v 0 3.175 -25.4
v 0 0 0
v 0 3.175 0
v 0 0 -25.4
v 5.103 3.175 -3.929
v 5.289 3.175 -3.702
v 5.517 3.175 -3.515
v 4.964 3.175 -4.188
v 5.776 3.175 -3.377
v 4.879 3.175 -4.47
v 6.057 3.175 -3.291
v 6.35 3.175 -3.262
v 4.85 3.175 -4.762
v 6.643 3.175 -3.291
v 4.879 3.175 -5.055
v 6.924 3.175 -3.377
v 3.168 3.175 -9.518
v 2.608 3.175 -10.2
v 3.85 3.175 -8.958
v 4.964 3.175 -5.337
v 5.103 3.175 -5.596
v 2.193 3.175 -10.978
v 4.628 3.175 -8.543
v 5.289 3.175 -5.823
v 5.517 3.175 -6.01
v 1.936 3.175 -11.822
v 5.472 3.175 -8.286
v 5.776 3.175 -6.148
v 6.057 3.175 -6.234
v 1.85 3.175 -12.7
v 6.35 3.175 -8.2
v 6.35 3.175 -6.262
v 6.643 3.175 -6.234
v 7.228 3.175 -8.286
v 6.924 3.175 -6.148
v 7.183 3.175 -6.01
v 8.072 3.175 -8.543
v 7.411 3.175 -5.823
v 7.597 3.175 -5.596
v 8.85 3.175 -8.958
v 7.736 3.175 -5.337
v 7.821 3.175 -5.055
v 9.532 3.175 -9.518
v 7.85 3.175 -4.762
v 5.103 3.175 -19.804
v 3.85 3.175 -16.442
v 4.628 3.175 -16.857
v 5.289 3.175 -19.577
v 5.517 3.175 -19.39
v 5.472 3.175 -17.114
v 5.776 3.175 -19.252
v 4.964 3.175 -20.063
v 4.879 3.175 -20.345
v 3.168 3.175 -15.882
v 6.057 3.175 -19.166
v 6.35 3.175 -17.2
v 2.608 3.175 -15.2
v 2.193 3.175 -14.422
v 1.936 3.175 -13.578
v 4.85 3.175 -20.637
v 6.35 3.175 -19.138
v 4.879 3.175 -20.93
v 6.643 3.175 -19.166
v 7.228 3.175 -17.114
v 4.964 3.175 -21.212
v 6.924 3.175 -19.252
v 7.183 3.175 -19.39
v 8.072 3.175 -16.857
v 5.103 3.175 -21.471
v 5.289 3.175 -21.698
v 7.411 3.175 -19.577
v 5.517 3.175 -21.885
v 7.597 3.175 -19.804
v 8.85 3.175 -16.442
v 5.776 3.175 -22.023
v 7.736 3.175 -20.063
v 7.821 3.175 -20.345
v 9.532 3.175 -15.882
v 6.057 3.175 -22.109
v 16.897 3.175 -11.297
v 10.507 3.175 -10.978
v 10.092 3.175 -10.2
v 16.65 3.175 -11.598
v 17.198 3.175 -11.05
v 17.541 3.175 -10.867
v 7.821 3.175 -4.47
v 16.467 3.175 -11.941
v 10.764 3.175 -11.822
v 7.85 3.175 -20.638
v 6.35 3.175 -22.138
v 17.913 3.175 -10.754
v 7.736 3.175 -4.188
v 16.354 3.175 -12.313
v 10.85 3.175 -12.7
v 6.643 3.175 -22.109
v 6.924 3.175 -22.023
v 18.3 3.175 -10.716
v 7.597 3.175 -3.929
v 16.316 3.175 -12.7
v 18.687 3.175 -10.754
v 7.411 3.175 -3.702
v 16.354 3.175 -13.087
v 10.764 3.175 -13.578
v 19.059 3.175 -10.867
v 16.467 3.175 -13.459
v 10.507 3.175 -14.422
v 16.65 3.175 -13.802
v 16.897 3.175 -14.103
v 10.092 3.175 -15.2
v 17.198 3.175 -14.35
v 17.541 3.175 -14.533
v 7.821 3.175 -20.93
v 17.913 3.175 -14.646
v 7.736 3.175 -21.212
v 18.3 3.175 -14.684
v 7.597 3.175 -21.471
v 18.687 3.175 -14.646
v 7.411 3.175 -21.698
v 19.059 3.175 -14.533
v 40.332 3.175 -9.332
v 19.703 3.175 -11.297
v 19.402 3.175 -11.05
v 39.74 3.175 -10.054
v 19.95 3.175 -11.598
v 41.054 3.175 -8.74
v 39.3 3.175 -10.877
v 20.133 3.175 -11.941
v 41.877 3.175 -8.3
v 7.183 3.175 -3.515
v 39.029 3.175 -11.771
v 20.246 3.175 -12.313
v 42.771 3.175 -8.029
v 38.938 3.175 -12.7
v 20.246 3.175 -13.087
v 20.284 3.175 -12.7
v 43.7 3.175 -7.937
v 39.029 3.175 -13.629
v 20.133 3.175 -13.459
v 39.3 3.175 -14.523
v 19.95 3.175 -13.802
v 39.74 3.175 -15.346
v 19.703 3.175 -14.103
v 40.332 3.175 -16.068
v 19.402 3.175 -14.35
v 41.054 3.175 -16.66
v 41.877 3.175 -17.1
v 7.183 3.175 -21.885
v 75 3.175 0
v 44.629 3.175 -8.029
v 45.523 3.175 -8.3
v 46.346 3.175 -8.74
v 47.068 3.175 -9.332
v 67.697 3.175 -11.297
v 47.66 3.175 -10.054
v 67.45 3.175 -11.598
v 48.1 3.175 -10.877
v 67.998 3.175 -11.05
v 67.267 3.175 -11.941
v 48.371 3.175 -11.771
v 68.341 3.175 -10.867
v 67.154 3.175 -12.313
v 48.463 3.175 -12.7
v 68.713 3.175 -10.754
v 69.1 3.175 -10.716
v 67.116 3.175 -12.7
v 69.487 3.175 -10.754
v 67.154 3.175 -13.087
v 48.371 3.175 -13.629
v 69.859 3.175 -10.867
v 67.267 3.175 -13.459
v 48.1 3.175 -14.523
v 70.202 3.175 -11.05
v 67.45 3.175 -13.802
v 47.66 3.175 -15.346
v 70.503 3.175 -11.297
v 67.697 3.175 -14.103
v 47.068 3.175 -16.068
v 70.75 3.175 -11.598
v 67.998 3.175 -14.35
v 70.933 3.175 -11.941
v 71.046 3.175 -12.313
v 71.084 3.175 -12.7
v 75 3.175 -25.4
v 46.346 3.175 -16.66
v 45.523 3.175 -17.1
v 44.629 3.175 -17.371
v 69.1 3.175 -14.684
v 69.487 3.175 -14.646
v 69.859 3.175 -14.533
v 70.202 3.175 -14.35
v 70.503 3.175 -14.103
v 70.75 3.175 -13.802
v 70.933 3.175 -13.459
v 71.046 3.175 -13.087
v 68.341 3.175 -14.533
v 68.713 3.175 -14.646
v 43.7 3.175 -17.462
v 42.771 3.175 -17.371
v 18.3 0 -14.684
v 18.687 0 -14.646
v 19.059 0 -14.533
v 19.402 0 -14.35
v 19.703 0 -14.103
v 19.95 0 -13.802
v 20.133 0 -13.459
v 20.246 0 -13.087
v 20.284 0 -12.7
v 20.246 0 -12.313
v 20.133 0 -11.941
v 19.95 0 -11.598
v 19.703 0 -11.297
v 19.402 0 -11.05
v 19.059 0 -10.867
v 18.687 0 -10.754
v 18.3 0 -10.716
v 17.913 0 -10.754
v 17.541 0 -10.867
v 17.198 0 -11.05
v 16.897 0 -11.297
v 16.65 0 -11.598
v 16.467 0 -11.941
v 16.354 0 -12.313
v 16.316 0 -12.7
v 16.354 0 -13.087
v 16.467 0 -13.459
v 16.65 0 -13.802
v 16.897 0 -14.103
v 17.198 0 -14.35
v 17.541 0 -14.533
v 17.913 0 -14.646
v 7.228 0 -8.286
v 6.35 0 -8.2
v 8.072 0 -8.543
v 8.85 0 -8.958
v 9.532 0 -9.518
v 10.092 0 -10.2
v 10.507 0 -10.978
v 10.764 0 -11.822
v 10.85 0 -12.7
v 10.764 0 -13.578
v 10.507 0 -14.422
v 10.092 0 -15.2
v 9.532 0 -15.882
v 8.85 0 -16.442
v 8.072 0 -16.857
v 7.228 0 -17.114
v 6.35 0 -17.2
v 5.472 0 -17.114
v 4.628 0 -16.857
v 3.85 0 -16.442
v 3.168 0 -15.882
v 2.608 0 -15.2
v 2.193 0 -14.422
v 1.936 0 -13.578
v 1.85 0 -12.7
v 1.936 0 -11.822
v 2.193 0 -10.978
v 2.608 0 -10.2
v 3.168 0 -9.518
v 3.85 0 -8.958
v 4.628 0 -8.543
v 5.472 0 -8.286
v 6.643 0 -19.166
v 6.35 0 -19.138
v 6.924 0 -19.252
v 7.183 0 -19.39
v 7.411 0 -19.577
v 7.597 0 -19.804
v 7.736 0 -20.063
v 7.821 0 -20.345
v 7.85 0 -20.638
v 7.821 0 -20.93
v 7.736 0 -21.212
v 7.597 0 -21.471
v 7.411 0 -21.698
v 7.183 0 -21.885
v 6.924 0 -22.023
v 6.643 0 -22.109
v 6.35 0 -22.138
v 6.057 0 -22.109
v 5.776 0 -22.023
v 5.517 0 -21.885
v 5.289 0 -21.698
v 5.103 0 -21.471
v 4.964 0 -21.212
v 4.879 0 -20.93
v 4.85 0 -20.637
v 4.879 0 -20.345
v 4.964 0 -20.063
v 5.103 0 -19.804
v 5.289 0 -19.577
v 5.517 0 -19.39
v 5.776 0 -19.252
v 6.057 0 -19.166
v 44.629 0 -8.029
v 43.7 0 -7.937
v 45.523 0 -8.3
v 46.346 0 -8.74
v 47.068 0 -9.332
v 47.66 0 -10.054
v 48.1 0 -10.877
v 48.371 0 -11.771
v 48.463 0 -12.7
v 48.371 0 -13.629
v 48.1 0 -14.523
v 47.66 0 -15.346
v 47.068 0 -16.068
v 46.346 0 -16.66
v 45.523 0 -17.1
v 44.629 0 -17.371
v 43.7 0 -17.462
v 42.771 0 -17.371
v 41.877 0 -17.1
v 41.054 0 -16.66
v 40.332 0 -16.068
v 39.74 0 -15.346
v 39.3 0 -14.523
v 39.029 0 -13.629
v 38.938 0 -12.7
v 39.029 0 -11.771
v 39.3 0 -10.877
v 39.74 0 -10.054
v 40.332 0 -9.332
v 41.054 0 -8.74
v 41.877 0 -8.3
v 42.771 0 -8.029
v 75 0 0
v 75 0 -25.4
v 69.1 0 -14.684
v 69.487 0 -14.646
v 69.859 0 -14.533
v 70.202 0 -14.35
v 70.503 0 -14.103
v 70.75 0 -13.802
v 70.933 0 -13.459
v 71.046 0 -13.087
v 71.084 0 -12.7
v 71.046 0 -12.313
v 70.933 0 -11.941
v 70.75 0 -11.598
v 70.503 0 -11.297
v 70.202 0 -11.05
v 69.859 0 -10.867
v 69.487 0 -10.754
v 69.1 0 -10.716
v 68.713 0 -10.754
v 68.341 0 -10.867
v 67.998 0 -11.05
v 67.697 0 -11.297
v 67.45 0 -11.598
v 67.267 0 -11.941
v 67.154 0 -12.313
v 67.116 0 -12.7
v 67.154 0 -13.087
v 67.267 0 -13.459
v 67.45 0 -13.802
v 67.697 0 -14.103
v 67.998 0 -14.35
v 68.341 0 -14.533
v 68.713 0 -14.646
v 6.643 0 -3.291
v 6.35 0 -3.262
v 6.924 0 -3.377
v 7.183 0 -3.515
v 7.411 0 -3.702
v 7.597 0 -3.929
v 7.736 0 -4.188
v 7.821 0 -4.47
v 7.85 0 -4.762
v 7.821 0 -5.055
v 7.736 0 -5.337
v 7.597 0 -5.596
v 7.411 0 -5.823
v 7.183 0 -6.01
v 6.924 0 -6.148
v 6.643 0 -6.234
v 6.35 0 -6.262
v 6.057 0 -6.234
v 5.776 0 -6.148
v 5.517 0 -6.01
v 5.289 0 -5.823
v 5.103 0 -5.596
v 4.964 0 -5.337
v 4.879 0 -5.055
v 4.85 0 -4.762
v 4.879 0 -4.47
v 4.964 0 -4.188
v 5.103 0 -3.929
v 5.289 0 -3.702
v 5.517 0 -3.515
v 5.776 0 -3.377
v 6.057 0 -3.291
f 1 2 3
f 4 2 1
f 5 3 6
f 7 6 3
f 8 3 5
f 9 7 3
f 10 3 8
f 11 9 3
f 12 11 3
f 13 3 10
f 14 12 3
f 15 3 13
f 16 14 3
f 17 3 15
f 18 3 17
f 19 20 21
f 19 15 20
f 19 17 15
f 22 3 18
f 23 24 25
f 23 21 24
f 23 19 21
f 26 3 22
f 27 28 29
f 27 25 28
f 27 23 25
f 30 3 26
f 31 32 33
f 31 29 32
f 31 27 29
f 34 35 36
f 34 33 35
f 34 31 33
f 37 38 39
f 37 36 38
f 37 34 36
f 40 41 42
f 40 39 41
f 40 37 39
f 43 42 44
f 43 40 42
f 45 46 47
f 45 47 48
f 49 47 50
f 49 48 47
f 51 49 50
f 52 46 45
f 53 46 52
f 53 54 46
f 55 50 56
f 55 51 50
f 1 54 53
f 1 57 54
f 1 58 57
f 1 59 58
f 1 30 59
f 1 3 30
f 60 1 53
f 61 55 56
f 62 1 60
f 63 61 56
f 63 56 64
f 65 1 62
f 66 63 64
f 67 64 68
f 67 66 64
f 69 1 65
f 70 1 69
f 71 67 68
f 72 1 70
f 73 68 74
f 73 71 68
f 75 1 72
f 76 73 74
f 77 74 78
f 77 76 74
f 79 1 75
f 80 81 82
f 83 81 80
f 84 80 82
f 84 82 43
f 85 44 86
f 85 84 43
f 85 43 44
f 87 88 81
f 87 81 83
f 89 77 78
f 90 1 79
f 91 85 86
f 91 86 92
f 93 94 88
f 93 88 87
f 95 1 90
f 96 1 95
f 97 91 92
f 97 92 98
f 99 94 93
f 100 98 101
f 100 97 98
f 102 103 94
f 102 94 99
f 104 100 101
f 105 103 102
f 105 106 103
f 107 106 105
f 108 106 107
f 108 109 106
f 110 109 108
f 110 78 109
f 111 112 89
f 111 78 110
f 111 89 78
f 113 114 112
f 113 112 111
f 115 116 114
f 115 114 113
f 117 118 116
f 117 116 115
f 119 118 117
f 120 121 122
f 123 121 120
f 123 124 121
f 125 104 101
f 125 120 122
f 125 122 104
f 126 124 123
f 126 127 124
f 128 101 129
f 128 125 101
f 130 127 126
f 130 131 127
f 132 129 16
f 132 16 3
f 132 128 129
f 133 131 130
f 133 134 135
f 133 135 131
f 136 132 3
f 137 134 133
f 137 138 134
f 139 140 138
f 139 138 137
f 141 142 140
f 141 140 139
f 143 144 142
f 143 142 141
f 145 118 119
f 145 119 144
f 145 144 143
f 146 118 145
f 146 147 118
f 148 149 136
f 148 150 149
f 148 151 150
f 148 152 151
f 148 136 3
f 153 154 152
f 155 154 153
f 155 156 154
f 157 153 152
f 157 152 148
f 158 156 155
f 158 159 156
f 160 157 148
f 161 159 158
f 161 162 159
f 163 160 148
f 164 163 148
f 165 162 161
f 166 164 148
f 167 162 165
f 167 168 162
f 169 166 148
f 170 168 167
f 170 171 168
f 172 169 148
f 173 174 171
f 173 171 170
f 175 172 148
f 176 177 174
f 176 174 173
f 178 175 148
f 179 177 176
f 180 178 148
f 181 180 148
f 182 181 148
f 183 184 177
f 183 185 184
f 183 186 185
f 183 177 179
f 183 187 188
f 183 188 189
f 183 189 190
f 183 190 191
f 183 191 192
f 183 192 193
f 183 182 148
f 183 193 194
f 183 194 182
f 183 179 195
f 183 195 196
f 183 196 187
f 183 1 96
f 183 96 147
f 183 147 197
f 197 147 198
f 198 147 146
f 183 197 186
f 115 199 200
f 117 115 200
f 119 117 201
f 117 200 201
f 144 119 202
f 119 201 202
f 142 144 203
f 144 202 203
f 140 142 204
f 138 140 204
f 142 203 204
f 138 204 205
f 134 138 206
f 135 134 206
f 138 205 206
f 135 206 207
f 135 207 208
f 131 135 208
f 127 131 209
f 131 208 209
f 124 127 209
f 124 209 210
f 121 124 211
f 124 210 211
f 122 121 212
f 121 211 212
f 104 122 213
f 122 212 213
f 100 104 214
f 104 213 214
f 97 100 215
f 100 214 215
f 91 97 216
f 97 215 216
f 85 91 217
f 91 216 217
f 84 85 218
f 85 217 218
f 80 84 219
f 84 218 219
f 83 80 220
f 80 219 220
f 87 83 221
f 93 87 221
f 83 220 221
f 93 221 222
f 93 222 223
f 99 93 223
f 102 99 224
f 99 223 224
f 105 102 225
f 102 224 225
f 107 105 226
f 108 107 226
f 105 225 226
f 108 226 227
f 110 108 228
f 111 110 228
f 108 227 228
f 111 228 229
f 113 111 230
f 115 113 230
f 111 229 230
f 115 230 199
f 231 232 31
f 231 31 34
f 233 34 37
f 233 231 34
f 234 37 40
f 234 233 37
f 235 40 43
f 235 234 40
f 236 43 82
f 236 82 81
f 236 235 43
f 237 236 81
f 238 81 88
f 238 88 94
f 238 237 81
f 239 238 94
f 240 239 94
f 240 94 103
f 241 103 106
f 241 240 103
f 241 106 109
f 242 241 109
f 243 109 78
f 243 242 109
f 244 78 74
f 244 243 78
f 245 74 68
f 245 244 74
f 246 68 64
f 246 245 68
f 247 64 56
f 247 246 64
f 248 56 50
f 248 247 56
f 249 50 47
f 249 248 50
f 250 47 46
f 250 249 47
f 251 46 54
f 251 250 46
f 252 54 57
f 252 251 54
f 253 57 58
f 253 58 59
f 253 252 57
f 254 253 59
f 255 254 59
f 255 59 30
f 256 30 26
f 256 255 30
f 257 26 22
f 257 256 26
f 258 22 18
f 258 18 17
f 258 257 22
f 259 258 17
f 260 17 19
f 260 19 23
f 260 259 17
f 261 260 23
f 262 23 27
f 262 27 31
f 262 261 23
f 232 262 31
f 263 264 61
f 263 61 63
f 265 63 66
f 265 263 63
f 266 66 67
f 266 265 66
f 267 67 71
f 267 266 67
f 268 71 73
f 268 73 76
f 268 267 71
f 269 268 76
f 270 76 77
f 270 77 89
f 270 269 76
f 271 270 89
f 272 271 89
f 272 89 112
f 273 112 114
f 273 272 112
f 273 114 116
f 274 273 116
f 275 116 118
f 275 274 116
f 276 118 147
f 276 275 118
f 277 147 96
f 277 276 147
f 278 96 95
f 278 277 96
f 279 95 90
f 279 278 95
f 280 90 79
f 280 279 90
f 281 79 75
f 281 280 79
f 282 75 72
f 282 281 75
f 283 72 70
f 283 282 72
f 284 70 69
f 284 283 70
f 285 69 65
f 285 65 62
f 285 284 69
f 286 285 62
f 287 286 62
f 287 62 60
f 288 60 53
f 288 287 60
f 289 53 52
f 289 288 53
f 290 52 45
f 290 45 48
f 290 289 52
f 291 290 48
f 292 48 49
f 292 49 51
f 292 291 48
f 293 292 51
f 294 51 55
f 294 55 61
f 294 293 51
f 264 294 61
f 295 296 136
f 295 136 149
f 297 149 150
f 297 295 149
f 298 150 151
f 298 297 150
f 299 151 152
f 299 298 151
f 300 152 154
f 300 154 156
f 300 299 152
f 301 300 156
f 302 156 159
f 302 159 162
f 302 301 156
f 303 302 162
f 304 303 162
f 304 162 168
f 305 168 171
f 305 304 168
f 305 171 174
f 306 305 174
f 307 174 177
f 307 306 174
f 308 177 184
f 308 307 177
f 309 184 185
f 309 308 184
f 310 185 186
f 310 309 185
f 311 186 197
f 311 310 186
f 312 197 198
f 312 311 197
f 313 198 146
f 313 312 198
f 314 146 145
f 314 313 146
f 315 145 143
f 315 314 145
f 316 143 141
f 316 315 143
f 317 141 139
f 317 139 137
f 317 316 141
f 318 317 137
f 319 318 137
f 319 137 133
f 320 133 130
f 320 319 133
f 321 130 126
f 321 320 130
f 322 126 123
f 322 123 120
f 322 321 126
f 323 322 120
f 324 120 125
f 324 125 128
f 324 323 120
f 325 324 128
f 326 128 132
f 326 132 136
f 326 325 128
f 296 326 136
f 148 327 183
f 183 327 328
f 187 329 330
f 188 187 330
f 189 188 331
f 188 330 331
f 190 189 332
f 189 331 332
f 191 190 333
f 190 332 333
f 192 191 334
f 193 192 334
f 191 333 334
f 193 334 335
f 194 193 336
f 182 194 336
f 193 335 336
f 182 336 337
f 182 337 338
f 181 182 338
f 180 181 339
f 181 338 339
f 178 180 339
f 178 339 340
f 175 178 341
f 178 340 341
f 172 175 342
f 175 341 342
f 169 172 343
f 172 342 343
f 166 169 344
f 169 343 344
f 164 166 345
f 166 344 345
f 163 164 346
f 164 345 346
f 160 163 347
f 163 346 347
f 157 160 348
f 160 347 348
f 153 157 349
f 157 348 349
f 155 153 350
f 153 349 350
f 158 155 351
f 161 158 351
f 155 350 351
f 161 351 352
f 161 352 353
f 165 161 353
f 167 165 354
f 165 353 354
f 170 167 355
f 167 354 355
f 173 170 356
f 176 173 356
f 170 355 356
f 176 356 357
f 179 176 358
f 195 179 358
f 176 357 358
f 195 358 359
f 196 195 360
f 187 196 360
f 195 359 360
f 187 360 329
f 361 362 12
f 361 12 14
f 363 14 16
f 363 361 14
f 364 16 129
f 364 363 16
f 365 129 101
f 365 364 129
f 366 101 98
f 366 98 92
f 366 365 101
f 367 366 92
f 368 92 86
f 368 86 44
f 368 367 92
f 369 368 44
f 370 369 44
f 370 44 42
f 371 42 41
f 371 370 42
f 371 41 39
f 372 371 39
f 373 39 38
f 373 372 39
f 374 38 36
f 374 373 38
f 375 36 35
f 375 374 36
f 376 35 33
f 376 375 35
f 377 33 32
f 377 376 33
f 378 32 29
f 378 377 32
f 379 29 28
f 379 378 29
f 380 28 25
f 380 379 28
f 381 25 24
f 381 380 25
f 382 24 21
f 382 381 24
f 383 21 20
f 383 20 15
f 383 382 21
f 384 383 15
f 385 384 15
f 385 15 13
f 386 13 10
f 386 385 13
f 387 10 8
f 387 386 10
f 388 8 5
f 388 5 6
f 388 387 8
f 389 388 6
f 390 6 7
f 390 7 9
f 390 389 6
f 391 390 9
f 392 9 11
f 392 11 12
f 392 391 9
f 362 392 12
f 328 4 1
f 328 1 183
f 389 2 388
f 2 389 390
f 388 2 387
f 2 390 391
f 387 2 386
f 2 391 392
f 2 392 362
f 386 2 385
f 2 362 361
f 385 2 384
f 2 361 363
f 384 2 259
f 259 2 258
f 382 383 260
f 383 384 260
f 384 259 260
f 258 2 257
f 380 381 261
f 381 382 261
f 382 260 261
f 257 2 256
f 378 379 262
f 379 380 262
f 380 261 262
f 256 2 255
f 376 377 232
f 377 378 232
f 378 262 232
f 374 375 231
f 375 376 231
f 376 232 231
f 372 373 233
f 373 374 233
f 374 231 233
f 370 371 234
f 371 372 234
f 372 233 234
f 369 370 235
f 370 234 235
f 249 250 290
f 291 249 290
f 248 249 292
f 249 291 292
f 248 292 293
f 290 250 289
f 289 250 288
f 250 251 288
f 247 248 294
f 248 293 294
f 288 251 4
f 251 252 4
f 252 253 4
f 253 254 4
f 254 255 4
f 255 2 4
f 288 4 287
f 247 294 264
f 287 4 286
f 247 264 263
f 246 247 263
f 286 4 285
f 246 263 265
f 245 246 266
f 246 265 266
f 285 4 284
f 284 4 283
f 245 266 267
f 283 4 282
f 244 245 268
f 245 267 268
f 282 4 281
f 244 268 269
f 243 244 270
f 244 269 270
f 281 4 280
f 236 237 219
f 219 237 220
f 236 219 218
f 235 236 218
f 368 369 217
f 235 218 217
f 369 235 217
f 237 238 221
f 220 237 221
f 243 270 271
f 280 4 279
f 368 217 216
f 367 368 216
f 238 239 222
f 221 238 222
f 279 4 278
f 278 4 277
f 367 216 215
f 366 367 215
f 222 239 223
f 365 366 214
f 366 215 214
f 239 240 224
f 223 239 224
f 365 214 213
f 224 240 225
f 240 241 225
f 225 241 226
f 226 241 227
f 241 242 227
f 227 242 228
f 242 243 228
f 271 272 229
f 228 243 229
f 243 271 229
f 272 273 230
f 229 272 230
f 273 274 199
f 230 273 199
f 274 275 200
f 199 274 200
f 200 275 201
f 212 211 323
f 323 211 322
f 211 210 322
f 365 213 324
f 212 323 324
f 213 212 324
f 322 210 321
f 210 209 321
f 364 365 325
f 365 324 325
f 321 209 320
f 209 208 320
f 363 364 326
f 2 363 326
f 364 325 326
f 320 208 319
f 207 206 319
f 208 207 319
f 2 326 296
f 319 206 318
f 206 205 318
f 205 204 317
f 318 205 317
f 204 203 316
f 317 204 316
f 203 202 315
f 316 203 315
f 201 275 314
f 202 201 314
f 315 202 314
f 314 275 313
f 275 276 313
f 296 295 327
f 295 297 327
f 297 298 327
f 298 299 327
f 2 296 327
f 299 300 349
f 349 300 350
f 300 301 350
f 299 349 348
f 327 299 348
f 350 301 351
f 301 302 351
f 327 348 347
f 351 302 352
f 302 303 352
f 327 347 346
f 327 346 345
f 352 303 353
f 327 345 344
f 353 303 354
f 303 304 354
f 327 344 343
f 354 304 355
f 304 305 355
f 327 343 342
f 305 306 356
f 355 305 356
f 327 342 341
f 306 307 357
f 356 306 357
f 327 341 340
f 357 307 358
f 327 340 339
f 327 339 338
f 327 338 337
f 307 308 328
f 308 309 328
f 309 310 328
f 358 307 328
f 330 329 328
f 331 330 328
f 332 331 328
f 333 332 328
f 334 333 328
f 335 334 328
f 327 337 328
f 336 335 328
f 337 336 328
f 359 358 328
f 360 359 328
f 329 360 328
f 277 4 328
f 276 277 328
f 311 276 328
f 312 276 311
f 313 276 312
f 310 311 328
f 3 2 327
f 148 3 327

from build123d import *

# Parameters (mm, degrees)
SKETCH1_W           = 75
SKETCH1_H           = 25.4
SKETCH1_R           = 4.7625
SKETCH1_R_2         = 1.5
SKETCH1_R_3         = 4.5
BOSS_EXTRUDE1_DEPTH = 3.175
SKETCH2_R           = 1.984375
CUT_EXTRUDE1_DEPTH  = 3.175


with BuildPart() as part:
    # Sketch1 → Boss-Extrude1 (new body)
    with BuildSketch(Plane(origin=(0, 0, 0), x_dir=(1, 0, 0), z_dir=(0, 1, 0))):
        with Locations((37.5, 12.7)):
            Rectangle(SKETCH1_W, SKETCH1_H)
        with Locations(Location((43.7, 12.7, 0), (0, 0, 270))):
            Circle(SKETCH1_R, mode=Mode.SUBTRACT)
        with Locations(Location((6.35, 20.6375, 0), (0, 0, 270))):
            Circle(SKETCH1_R_2, mode=Mode.SUBTRACT)
        with Locations(Location((6.35, 4.7625, 0), (0, 0, 270))):
            Circle(SKETCH1_R_2, mode=Mode.SUBTRACT)
        with Locations(Location((6.35, 12.7, 0), (0, 0, 270))):
            Circle(SKETCH1_R_3, mode=Mode.SUBTRACT)
    extrude(amount=BOSS_EXTRUDE1_DEPTH)

    # Sketch2 → Cut-Extrude1 (cut)
    with BuildSketch(Plane(origin=(0, 0, 0), x_dir=(-1, 0, 0), z_dir=(0, -1, 0))):
        with Locations(Location((-18.3, 12.7, 0), (0, 0, 90))):
            Circle(SKETCH2_R)
        with Locations(Location((-69.1, 12.7, 0), (0, 0, 90))):
            Circle(SKETCH2_R)
    extrude(amount=-CUT_EXTRUDE1_DEPTH, mode=Mode.SUBTRACT)


solid = part.part
